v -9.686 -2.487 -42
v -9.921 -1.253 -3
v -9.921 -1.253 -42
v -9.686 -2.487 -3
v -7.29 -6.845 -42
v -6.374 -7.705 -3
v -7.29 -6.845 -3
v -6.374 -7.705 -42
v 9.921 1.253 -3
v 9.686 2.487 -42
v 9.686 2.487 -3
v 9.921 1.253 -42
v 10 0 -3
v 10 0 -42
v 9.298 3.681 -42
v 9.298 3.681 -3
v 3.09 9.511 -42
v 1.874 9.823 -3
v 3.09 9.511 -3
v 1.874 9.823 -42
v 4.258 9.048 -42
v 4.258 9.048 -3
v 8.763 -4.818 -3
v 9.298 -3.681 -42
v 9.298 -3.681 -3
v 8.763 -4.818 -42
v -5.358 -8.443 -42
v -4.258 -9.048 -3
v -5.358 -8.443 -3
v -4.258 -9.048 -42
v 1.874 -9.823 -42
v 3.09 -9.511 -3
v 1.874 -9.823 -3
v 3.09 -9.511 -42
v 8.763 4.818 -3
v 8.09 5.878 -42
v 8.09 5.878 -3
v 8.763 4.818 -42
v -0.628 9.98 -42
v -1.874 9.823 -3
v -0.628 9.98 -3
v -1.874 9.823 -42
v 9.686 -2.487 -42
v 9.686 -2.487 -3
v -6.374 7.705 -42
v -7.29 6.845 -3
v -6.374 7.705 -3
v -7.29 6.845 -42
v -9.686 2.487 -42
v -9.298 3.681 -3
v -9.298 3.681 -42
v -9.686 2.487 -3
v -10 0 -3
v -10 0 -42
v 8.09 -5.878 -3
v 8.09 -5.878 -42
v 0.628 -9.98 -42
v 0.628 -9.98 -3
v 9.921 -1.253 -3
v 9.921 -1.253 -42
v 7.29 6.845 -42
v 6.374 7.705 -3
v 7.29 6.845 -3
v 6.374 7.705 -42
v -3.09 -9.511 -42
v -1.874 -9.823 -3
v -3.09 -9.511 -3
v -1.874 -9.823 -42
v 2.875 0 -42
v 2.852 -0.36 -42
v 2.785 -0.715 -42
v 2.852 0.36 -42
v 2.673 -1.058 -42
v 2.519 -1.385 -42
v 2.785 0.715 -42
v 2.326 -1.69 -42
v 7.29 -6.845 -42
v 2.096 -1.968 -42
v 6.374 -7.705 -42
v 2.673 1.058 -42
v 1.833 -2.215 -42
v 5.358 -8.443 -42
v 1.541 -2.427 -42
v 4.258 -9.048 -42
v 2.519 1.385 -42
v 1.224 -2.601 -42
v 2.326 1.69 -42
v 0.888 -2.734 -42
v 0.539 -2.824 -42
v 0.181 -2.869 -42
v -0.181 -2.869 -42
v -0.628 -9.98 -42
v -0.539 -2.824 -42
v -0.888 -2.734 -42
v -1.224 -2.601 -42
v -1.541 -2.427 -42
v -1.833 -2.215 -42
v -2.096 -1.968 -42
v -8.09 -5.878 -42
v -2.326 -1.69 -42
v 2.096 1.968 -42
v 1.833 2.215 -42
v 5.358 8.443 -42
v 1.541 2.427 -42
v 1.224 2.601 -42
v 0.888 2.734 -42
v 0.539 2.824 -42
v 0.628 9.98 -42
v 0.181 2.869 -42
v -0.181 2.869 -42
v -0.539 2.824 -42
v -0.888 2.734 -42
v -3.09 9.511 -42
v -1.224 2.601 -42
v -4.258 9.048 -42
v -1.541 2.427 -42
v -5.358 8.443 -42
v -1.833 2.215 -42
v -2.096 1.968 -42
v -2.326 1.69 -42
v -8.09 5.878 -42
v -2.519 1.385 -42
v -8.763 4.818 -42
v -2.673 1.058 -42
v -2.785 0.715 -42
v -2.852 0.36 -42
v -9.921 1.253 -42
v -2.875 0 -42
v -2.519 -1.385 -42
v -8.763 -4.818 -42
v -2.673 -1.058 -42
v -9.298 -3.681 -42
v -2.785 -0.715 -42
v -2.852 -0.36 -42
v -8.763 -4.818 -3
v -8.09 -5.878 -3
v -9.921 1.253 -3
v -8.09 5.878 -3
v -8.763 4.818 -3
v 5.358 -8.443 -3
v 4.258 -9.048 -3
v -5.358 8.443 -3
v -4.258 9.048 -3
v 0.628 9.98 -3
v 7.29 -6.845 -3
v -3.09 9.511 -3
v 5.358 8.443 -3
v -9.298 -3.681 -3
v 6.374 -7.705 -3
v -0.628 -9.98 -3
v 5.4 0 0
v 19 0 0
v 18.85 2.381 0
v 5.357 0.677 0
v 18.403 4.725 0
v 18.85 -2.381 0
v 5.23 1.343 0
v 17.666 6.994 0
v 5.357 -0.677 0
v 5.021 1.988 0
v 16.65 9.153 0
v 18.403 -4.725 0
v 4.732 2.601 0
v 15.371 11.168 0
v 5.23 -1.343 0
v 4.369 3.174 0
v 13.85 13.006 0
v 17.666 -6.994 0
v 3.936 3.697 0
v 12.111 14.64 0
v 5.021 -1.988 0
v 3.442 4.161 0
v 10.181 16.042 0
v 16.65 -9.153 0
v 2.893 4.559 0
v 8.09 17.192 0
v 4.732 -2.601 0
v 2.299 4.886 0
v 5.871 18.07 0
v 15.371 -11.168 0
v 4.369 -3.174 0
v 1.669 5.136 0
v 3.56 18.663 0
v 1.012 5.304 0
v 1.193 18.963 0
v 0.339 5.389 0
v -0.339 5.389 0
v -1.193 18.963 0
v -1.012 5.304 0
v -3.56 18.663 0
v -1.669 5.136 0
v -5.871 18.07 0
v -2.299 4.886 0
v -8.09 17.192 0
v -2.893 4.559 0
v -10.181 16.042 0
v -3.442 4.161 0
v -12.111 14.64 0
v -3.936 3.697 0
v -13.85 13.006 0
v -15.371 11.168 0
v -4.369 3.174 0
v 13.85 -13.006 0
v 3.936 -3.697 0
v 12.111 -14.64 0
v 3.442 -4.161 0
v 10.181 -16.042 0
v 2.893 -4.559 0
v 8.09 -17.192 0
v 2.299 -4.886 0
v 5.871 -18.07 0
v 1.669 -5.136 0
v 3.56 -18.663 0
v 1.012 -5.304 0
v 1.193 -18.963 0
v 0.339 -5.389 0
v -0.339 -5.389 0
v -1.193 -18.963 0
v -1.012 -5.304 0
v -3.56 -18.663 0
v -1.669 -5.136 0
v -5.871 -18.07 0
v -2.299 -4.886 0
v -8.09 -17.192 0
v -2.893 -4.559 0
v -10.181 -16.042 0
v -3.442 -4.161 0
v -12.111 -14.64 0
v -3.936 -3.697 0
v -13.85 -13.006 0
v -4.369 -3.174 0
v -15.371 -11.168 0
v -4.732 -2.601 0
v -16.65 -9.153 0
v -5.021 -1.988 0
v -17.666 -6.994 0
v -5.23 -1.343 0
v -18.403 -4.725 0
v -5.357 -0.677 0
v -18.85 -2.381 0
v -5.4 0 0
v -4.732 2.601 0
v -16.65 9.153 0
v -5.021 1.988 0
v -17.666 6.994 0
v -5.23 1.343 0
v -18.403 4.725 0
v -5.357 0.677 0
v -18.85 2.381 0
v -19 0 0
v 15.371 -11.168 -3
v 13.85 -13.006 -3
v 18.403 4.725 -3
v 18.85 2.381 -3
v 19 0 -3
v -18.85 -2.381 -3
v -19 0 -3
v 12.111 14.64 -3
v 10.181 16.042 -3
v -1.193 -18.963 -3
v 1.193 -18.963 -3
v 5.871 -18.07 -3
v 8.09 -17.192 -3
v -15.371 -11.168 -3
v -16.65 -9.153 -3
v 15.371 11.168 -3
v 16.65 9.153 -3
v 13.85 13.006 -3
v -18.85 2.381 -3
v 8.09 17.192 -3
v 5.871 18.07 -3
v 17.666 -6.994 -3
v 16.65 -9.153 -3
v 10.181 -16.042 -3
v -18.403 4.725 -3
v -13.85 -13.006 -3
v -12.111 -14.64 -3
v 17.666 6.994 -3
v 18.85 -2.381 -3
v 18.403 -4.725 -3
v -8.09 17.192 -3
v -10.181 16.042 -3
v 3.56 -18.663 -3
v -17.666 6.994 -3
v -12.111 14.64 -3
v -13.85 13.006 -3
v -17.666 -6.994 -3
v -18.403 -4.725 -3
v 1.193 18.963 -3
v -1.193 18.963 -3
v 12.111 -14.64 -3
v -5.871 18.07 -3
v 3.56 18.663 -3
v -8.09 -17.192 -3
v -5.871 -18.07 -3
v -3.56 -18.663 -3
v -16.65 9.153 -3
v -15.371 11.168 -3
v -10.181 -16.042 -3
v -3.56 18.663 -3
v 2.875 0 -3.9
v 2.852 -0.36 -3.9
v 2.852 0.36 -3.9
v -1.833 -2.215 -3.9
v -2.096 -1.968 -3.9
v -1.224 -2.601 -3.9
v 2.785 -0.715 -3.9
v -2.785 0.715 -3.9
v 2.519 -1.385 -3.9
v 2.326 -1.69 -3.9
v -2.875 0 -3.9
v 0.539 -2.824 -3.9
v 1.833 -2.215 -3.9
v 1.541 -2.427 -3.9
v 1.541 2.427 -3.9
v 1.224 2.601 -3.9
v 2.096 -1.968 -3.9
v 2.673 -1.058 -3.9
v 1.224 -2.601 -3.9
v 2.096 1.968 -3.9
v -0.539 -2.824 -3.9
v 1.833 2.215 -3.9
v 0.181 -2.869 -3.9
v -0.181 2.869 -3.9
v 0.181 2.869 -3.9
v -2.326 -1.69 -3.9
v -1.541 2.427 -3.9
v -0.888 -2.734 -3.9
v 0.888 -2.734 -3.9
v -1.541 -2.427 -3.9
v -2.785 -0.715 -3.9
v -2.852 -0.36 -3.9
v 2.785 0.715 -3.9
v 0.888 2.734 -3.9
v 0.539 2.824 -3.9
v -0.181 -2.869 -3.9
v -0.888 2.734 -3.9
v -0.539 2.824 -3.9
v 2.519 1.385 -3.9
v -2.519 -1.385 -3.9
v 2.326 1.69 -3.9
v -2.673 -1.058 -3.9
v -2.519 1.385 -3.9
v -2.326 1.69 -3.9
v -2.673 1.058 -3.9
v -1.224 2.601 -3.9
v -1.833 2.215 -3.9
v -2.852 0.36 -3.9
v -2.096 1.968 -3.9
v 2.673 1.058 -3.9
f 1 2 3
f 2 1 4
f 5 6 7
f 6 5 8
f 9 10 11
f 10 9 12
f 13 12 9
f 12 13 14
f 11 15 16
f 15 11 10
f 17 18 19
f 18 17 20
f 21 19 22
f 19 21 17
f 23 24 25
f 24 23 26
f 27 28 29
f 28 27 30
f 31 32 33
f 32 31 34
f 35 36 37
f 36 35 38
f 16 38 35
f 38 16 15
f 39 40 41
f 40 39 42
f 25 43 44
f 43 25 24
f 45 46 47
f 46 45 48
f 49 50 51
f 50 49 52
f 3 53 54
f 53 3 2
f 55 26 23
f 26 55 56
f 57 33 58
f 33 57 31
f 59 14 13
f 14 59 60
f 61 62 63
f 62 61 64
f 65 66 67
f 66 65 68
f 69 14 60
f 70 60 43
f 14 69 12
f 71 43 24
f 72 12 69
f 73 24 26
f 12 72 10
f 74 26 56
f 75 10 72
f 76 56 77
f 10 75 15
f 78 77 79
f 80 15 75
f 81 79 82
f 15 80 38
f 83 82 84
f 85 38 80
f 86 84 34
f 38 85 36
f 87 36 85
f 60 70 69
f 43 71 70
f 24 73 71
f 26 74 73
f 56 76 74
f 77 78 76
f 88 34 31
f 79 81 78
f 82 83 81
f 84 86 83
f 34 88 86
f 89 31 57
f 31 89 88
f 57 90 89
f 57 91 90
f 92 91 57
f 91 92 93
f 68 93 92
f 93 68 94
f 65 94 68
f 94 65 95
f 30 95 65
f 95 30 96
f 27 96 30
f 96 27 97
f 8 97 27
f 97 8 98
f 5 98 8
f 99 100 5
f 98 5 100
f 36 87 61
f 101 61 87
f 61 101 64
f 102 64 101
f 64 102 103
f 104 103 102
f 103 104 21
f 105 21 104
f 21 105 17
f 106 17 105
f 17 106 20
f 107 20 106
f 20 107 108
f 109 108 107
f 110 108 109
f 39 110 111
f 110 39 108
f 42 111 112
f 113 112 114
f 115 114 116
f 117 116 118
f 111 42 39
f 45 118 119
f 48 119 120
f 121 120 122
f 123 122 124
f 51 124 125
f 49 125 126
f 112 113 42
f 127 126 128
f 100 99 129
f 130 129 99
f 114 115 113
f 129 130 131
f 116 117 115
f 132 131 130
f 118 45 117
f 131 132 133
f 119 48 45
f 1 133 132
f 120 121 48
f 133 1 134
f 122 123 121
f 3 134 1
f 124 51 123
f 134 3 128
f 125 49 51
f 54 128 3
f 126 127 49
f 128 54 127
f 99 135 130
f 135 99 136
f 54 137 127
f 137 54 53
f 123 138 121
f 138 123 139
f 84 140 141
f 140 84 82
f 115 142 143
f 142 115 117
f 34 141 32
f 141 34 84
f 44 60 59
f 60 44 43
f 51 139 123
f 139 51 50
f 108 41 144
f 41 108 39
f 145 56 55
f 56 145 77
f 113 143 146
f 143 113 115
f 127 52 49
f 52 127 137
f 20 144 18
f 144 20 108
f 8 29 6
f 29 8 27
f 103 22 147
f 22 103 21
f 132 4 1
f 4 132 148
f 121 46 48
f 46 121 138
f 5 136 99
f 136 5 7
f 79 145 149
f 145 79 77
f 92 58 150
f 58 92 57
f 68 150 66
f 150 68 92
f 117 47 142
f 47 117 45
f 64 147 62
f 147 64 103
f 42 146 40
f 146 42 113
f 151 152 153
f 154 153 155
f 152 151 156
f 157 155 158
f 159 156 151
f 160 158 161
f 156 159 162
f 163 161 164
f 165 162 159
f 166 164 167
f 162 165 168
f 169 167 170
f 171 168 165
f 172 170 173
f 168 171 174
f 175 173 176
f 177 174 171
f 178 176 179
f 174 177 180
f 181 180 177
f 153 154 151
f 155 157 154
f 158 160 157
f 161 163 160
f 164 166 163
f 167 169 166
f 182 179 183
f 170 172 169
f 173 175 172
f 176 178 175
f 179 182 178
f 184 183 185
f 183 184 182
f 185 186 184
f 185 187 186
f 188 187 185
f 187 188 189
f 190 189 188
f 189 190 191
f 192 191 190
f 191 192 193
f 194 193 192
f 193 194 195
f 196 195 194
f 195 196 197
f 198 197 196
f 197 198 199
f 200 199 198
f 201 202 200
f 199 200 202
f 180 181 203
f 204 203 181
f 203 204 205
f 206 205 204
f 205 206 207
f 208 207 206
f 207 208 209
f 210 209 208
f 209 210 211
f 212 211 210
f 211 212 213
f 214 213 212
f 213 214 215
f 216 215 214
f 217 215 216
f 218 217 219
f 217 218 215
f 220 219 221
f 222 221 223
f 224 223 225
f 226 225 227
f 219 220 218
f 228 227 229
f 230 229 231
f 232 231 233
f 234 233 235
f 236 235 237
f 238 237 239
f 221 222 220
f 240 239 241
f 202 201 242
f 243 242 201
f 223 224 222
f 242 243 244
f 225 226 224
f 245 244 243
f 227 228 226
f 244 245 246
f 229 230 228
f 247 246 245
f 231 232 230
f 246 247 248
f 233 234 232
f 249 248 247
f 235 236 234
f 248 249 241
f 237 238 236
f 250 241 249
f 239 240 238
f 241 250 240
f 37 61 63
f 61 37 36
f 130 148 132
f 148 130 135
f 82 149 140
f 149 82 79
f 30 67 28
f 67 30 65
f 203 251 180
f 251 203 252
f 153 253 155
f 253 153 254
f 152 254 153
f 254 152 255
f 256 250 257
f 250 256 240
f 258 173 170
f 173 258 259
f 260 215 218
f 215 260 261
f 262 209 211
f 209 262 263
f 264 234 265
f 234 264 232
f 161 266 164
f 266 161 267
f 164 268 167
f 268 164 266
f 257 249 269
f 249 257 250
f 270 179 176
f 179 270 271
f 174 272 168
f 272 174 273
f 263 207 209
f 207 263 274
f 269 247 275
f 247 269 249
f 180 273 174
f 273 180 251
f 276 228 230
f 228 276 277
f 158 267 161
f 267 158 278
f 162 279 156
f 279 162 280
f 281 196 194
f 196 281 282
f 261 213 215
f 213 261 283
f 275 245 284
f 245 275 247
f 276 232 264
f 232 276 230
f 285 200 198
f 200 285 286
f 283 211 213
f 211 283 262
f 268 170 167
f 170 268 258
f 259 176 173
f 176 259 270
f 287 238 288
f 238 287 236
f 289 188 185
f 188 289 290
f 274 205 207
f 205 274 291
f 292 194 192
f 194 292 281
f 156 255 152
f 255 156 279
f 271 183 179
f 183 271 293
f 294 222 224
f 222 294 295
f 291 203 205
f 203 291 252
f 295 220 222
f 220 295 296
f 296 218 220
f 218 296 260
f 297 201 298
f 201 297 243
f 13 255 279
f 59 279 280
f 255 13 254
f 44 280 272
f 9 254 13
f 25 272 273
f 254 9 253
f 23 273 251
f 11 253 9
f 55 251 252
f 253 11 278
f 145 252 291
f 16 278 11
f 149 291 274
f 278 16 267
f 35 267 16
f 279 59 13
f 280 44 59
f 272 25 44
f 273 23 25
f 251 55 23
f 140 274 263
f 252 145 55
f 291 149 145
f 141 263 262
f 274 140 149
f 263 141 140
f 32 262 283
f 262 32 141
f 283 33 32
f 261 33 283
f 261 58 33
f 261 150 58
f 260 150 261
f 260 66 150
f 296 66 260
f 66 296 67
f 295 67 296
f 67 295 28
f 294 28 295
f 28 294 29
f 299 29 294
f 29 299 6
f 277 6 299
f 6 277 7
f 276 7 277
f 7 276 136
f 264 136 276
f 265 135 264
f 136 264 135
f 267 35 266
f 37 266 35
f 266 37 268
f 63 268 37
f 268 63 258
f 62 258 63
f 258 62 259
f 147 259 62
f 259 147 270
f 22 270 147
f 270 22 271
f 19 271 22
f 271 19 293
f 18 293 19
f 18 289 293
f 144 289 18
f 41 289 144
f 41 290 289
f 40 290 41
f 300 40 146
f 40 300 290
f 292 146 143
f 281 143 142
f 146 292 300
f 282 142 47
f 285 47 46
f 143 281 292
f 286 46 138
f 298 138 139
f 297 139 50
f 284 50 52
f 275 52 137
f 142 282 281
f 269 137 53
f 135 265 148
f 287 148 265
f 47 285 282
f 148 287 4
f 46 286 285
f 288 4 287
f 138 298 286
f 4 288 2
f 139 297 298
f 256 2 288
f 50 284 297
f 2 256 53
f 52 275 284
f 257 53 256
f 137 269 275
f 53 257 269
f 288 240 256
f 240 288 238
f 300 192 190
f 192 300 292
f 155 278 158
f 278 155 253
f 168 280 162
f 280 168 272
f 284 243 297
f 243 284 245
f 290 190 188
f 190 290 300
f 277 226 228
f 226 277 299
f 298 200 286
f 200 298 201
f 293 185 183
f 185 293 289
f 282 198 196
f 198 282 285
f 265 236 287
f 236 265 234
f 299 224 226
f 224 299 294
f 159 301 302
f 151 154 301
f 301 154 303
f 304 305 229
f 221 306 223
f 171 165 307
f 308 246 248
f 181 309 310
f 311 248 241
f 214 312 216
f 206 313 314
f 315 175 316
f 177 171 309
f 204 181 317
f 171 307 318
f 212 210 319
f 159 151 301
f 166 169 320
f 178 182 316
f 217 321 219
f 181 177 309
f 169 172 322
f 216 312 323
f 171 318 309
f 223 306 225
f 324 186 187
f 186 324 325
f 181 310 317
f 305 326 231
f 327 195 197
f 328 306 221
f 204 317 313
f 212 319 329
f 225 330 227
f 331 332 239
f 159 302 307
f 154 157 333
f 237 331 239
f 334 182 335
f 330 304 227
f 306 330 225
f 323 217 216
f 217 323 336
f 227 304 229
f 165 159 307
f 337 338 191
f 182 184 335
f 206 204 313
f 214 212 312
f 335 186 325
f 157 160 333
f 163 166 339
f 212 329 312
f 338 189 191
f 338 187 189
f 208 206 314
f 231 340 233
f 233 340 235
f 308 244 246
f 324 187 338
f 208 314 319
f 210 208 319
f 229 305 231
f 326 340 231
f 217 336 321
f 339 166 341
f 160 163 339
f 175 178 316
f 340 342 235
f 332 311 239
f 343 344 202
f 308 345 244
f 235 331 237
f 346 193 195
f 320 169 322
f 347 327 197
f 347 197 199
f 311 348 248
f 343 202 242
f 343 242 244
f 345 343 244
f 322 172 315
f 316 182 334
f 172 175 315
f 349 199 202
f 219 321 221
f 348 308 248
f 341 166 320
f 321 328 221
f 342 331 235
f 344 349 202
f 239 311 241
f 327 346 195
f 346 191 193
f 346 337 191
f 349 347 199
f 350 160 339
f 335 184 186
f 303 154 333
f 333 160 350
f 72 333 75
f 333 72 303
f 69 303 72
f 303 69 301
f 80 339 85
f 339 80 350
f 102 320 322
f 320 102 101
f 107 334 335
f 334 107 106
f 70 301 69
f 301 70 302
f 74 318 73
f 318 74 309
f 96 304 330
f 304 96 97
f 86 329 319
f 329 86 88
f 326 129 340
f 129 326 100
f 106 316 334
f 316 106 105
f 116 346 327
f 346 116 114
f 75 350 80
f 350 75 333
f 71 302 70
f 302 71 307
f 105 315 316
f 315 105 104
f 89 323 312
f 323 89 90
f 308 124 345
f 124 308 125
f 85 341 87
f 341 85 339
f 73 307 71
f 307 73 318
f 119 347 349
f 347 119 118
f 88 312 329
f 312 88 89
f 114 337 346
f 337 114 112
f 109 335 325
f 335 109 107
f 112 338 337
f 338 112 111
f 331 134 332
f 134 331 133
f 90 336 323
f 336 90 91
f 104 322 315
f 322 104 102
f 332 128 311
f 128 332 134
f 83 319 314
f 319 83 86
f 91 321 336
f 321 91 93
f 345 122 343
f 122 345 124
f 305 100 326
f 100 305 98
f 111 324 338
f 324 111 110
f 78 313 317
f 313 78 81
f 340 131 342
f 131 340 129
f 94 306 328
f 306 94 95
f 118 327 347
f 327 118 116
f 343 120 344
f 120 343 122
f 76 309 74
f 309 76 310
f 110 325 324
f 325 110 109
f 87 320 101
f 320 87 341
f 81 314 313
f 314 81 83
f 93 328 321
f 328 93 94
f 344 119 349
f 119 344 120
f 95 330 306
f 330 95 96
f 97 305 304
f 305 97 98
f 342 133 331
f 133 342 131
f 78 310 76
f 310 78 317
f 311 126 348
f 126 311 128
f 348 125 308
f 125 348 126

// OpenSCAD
$fn = 50;


difference() {
	union() {
		translate(v = [0, 0, -42.0000000000]) {
			cylinder(h = 42, r = 10.0000000000);
		}
		translate(v = [0, 0, -3.0000000000]) {
			cylinder(h = 3, r = 19.0000000000);
		}
	}
	union() {
		translate(v = [0, 0, 0]) {
			rotate(a = [0, 0, 0]) {
				difference() {
					union() {
						#translate(v = [0, 0, -42.0000000000]) {
							cylinder(h = 42, r = 2.6000000000);
						}
						#translate(v = [0, 0, -3.9000000000]) {
							cylinder(h = 3.9000000000, r1 = 2.8750000000, r2 = 5.4000000000);
						}
						#translate(v = [0, 0, -42.0000000000]) {
							cylinder(h = 42, r = 2.8750000000);
						}
						#translate(v = [0, 0, -42.0000000000]) {
							cylinder(h = 42, r = 2.6000000000);
						}
					}
					union();
				}
			}
		}
	}
}
